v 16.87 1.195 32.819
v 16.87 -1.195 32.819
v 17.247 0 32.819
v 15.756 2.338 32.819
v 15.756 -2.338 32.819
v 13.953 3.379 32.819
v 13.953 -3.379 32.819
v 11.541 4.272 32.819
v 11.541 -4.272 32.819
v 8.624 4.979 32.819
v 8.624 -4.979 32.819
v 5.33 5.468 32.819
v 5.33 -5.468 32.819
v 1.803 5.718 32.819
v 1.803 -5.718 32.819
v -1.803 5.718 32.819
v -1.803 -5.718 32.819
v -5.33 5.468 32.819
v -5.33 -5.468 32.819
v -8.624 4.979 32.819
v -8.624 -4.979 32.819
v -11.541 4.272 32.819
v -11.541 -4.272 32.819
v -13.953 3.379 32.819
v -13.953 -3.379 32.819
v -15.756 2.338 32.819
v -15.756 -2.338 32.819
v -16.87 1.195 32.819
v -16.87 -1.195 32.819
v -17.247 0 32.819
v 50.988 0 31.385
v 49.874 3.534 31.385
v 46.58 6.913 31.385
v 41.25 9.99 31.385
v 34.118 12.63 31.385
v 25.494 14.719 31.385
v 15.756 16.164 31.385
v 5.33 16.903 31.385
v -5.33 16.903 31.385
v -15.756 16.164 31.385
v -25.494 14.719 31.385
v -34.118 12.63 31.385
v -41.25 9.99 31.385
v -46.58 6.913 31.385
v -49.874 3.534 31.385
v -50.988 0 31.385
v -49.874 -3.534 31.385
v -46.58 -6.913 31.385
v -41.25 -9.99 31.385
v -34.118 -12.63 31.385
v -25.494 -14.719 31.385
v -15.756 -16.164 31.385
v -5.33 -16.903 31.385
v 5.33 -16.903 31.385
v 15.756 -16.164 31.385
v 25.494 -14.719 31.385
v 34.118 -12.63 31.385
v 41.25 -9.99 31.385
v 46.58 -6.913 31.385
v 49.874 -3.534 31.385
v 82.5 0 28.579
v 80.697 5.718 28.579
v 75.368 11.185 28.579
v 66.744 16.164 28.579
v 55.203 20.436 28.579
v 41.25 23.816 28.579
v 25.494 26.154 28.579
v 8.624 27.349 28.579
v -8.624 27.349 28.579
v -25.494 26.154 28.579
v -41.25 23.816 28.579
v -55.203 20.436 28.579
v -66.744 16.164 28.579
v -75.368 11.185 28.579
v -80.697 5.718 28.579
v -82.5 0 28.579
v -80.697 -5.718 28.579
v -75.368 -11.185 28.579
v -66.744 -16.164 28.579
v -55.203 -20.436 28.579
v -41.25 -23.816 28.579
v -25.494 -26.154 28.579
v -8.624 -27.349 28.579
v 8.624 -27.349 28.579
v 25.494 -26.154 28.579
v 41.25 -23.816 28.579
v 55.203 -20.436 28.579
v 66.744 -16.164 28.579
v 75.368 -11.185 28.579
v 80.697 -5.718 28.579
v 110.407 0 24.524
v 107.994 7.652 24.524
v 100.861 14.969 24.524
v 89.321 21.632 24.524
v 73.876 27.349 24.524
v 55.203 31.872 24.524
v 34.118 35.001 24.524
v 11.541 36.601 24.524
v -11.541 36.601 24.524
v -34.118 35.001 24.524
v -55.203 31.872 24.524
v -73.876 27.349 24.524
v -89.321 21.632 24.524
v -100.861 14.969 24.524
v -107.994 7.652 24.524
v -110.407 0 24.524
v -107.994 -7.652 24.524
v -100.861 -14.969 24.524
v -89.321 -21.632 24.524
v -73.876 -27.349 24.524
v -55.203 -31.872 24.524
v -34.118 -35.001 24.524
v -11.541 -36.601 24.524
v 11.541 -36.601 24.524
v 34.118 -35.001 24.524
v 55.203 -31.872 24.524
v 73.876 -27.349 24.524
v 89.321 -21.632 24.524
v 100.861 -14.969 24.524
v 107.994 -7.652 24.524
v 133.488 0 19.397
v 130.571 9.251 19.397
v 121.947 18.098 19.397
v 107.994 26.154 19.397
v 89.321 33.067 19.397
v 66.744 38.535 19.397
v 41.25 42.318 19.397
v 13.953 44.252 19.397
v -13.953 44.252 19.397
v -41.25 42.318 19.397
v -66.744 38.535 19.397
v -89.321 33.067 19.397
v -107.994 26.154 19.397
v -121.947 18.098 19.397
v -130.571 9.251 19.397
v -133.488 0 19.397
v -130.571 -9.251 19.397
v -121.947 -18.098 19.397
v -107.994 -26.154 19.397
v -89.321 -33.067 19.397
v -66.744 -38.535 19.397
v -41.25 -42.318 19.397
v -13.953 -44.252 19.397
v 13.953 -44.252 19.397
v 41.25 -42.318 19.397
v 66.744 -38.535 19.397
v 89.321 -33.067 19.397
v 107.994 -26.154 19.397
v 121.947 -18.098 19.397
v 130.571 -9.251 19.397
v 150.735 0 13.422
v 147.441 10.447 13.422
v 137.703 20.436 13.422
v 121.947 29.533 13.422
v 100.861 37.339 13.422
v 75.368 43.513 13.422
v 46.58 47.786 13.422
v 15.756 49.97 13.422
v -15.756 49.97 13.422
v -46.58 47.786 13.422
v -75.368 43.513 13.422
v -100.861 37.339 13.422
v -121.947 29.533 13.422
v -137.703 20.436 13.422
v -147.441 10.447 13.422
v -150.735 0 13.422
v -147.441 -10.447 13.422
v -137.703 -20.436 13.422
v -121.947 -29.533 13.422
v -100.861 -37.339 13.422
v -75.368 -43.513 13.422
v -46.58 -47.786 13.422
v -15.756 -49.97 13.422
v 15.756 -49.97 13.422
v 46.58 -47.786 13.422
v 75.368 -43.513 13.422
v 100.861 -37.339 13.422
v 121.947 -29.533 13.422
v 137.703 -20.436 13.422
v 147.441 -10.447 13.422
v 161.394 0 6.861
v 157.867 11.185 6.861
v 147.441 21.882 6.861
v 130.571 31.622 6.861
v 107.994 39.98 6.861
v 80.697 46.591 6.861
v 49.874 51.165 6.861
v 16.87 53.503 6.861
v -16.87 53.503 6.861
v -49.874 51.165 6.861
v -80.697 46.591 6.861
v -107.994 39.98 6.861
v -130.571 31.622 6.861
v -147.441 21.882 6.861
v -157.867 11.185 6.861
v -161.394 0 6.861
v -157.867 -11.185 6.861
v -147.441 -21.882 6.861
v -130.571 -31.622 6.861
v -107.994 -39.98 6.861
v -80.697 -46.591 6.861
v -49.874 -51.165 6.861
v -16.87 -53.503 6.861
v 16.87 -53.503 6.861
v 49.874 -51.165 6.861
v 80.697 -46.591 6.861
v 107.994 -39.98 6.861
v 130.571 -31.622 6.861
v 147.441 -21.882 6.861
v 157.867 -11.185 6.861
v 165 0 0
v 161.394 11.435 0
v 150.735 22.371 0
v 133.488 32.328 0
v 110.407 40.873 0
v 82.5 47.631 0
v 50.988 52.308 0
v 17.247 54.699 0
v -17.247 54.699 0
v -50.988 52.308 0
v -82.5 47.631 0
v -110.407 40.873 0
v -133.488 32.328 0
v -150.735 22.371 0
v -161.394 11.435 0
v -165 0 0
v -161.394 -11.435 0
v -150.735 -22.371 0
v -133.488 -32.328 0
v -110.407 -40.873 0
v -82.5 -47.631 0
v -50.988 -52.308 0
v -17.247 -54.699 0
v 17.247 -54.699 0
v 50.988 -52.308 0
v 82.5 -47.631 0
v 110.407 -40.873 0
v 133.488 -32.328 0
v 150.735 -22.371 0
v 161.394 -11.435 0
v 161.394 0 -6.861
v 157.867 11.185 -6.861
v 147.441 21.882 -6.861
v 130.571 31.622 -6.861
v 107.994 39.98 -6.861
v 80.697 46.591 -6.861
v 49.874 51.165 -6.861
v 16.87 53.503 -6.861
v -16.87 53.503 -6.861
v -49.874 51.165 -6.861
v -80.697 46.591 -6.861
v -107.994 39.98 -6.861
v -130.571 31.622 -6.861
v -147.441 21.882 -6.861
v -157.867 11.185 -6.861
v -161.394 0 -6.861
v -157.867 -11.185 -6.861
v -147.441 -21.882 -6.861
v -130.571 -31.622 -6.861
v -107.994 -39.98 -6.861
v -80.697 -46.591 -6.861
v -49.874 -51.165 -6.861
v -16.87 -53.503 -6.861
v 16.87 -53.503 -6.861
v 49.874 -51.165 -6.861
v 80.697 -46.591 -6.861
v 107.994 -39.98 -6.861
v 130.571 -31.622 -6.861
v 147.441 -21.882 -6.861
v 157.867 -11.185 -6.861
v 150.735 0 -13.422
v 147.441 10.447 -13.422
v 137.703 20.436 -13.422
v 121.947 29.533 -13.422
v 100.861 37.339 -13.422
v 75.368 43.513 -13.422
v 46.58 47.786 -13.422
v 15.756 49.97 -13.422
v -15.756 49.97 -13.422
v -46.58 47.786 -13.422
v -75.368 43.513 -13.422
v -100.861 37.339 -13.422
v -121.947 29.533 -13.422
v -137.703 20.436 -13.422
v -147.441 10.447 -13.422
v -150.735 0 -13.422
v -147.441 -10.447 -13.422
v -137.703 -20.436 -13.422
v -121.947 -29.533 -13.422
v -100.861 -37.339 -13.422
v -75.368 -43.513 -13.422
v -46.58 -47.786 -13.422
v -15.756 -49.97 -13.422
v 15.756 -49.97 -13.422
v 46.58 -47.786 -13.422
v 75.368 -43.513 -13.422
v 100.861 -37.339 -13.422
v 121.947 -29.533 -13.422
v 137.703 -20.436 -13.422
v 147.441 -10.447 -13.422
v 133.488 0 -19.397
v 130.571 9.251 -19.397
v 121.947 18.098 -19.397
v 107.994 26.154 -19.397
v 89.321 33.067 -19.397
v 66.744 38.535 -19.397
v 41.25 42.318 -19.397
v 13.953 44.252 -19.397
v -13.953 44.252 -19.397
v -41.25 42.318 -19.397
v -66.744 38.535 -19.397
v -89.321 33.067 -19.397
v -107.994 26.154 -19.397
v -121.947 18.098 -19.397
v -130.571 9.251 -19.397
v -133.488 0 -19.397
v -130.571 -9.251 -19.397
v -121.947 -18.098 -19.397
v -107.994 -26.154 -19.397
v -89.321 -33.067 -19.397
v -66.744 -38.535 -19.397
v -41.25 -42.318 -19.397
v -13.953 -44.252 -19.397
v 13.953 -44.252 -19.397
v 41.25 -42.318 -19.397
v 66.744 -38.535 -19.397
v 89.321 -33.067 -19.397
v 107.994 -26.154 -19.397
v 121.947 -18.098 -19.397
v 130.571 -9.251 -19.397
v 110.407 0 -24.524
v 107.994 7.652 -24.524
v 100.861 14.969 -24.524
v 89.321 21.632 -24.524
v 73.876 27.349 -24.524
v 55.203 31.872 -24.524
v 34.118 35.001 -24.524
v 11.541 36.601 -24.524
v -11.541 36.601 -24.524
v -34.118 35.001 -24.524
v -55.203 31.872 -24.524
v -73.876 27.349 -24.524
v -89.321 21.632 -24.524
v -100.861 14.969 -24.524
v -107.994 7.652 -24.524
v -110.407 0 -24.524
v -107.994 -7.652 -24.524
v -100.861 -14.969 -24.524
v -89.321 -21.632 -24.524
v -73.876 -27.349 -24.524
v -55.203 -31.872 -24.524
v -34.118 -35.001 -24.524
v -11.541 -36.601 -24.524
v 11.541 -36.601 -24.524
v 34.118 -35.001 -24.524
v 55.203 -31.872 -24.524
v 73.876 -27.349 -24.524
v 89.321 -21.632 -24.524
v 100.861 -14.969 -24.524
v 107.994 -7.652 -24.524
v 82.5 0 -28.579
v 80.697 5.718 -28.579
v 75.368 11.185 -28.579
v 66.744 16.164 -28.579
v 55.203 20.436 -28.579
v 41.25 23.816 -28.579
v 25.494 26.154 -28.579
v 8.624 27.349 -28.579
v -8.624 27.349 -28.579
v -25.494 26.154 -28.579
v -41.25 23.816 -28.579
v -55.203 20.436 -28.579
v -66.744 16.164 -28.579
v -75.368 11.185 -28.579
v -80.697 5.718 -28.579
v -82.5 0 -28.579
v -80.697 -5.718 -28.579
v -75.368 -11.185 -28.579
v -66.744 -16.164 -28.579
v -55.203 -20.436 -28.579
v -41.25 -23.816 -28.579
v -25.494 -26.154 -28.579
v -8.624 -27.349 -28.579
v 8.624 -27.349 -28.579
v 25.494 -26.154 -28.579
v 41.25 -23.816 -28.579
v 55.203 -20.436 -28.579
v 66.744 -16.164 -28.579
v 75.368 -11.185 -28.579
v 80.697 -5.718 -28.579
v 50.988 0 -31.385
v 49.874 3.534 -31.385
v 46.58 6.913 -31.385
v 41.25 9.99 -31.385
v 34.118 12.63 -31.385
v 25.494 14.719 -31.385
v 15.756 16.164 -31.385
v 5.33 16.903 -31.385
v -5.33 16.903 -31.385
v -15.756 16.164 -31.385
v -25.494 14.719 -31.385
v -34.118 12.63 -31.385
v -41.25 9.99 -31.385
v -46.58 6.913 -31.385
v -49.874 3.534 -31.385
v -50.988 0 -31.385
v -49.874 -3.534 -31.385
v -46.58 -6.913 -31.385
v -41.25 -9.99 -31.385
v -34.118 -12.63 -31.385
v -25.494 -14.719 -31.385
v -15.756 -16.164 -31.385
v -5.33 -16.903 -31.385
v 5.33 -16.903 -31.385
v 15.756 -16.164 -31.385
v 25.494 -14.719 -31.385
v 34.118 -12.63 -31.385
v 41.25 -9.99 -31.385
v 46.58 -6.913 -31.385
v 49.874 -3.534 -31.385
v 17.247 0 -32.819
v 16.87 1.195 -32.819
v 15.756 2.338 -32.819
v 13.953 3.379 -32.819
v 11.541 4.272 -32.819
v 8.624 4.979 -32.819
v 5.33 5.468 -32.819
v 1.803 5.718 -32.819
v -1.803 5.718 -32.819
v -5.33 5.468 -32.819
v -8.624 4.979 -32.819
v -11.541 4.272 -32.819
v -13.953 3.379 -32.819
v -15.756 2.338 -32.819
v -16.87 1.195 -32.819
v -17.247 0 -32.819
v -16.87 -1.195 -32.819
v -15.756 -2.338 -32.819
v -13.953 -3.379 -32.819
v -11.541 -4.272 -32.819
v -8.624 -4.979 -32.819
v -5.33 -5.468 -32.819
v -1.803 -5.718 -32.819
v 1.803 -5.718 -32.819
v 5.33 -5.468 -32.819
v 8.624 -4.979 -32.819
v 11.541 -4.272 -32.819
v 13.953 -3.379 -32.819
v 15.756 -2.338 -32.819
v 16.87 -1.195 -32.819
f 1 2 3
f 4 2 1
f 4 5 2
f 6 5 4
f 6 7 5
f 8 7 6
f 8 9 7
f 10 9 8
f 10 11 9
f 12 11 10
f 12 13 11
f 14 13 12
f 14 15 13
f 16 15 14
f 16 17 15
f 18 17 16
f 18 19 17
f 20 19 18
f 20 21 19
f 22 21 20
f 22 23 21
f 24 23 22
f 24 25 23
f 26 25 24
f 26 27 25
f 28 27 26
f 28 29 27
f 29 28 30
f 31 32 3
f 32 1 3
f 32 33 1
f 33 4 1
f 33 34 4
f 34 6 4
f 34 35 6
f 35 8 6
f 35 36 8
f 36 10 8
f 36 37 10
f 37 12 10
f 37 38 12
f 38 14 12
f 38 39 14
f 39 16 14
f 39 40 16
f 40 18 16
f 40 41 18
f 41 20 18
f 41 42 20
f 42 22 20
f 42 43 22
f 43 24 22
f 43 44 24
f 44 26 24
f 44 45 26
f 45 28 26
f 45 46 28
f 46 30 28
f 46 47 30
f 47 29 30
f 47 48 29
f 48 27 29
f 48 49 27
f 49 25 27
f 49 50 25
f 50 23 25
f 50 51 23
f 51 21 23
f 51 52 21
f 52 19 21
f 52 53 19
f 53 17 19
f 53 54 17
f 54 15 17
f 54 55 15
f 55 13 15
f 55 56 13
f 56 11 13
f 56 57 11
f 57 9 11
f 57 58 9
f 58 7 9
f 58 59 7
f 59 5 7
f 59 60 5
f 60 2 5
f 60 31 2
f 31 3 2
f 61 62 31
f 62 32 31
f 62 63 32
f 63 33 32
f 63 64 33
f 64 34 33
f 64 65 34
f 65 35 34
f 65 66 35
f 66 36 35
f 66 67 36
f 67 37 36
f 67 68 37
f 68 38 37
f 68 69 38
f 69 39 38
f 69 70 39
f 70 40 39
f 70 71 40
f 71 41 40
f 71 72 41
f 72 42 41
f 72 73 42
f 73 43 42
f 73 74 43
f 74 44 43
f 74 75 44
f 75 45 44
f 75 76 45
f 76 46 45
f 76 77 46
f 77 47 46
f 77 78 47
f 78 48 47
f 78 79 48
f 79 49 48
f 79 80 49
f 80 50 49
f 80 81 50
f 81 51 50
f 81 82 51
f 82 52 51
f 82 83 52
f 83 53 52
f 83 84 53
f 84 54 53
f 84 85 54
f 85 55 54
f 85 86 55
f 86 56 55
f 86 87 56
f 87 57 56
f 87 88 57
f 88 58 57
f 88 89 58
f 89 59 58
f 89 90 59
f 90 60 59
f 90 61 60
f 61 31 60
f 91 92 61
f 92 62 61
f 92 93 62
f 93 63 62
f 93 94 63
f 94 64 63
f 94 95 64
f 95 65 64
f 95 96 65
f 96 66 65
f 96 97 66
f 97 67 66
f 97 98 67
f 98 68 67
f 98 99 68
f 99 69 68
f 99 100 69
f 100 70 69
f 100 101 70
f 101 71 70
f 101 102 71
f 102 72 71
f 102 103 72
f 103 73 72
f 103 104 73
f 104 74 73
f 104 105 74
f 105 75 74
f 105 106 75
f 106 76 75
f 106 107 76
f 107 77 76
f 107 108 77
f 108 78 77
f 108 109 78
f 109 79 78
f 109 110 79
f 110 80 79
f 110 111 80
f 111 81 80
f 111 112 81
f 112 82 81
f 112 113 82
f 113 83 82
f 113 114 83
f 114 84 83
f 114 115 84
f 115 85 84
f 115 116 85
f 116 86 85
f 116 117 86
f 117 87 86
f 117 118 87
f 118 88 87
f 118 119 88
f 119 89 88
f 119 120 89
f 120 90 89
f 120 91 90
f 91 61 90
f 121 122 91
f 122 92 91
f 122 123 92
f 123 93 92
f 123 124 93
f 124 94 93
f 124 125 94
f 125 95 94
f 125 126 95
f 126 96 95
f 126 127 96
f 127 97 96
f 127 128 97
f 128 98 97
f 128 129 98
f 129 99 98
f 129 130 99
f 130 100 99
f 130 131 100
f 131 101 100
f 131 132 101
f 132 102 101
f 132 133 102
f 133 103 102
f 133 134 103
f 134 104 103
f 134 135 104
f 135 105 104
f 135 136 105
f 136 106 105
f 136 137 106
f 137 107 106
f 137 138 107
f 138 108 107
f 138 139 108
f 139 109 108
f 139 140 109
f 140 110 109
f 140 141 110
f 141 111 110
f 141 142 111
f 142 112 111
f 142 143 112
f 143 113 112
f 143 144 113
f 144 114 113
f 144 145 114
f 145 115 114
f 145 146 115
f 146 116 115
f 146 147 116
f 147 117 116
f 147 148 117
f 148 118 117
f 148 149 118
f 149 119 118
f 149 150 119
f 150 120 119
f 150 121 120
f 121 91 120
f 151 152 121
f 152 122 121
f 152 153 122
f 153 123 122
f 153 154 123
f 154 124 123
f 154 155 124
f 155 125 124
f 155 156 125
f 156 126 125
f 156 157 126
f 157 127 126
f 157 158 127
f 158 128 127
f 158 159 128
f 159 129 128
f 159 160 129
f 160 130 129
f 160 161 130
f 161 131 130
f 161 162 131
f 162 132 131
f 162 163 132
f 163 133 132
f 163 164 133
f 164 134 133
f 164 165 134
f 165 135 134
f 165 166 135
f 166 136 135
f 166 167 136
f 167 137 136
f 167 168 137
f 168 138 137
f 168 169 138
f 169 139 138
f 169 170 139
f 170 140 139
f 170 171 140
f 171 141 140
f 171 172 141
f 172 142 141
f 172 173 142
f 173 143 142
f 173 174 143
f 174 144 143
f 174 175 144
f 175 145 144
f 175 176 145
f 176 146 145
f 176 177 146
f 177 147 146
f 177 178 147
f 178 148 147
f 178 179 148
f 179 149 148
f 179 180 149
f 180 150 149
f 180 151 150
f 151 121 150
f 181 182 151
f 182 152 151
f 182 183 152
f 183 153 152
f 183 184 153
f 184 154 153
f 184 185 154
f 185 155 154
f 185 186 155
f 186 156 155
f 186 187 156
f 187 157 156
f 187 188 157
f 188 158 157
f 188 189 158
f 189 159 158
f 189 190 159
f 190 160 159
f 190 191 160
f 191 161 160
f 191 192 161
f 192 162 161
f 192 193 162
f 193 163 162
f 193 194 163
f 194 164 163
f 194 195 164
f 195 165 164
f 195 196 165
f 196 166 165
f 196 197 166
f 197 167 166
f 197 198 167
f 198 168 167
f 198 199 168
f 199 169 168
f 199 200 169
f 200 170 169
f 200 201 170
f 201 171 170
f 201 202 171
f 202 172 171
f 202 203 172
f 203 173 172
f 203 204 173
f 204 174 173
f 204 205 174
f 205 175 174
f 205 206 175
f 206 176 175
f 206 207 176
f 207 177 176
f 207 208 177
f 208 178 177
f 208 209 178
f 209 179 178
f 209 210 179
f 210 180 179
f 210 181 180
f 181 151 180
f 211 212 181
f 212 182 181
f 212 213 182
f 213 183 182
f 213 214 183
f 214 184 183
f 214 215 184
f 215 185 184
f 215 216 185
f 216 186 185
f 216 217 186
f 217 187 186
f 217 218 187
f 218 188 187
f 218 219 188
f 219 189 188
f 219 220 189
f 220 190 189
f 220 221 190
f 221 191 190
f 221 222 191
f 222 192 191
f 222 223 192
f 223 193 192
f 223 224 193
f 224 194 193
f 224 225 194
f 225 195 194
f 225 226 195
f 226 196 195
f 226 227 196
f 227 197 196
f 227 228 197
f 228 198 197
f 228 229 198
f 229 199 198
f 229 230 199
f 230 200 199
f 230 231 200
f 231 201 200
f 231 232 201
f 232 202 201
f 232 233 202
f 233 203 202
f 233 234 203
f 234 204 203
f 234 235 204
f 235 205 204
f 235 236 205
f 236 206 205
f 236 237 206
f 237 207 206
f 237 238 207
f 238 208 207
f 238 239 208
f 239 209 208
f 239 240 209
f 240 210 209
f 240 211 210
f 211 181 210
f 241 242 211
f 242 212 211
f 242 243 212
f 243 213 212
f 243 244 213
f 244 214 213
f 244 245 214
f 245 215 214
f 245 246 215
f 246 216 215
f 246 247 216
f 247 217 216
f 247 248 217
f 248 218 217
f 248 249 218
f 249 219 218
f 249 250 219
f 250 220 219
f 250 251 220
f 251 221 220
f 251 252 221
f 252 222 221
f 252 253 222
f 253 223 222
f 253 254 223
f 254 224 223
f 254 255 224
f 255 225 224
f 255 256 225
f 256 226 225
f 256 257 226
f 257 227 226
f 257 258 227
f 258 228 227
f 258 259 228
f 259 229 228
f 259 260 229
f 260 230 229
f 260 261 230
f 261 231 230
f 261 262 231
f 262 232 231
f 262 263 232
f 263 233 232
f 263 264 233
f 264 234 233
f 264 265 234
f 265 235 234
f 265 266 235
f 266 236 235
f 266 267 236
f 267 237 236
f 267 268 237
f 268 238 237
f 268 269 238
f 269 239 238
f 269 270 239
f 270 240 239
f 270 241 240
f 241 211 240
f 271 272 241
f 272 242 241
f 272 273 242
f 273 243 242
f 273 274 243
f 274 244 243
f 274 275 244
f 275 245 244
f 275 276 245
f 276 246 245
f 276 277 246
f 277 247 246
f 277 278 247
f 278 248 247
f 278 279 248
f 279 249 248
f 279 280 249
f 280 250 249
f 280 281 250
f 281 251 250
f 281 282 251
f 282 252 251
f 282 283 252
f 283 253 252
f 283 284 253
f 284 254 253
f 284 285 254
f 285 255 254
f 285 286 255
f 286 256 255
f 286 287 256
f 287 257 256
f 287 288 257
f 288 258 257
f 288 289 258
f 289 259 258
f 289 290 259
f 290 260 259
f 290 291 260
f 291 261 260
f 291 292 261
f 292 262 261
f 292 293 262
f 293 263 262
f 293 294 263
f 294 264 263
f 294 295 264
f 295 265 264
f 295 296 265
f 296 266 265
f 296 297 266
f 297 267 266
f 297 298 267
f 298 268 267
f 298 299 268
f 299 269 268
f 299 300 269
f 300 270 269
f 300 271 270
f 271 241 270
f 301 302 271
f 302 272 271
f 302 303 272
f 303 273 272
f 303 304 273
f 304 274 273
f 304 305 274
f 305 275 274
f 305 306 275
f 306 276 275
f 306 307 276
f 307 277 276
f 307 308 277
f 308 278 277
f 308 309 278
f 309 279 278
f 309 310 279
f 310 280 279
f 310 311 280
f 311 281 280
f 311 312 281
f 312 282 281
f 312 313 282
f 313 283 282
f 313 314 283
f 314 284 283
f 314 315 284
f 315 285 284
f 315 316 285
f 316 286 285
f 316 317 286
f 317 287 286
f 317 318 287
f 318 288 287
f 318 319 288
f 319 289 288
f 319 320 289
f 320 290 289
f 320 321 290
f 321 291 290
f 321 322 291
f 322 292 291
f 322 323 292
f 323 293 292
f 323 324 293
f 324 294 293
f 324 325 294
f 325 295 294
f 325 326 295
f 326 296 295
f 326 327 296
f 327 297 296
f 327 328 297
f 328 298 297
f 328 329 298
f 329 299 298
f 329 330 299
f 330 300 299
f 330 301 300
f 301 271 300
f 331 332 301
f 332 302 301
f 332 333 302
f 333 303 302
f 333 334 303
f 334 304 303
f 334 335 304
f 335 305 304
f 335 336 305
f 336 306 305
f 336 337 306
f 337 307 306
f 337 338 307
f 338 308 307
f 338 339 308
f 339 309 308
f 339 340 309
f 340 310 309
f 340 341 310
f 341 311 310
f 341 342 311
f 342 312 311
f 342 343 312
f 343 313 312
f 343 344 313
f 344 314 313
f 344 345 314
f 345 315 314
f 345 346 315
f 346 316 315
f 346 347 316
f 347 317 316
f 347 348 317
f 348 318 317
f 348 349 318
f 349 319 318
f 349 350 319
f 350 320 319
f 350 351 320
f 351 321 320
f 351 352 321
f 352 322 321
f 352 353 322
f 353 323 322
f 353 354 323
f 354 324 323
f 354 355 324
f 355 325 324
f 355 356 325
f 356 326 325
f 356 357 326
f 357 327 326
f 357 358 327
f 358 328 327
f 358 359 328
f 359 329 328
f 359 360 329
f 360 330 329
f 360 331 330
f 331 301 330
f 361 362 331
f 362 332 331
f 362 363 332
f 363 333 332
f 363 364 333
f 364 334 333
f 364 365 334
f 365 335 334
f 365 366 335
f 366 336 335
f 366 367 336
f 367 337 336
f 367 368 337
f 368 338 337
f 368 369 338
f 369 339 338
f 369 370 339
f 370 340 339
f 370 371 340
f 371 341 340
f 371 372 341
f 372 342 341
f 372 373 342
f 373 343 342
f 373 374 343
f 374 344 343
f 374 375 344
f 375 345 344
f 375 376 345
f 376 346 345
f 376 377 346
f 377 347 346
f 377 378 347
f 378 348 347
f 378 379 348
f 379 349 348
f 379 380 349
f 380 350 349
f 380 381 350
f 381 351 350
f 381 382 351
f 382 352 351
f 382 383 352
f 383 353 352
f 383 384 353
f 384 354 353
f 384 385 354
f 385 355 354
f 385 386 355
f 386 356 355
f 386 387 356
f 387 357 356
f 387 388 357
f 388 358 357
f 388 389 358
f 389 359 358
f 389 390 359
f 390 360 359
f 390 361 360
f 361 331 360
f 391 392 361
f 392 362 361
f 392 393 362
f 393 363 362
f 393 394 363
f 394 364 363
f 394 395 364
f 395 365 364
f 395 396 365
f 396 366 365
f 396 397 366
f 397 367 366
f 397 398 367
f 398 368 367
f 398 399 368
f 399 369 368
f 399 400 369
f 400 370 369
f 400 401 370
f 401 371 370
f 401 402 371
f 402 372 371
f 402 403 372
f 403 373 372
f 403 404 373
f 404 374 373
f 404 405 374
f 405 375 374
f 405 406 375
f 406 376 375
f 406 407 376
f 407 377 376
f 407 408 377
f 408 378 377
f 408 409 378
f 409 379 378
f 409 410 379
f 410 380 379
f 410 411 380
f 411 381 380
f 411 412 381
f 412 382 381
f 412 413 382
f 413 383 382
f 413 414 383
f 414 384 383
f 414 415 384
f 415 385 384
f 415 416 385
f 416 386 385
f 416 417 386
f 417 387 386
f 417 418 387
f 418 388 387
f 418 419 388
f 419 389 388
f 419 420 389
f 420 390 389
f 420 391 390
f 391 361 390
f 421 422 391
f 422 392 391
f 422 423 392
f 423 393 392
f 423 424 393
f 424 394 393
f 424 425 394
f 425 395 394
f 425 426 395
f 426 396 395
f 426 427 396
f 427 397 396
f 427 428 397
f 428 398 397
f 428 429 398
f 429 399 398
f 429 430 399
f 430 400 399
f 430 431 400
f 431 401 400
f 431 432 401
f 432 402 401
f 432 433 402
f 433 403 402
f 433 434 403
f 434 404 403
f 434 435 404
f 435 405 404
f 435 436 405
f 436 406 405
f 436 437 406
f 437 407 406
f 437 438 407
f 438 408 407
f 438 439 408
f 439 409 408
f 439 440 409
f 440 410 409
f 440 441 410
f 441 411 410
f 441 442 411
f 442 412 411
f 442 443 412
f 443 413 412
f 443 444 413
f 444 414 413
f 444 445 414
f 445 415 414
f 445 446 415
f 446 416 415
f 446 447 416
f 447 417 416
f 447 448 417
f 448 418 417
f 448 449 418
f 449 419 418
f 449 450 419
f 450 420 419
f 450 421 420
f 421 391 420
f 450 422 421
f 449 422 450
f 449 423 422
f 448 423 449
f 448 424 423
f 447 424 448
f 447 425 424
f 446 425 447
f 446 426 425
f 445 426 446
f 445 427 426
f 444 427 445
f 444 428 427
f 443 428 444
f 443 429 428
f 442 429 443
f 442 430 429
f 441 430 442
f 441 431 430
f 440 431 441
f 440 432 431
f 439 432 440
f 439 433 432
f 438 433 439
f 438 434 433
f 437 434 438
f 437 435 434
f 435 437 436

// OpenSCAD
// Generated by SolidPython 1.0.1 on 2020-07-29 00:46:51


scale(v = [15, 5, 3]) {
	sphere(r = 11);
}
/***********************************************
*********      SolidPython code:      **********
************************************************
 
# import packages: SolidPython
from solid import *
from solid.utils import *
from itertools import chain, combinations, permutations


class Resize:

    def __init__(self, scad_file):
        self.scad_file = scad_file
        #self.scad_file = import_scad(scad_file)
        # cone/cylinder param:
        self.r1 = 0
        self.r2 = 0
        self.h = 0
        # rectangular prism param:
        self.w = 0
        self.l = 0
        # ellipse param:
        self.r = 0

    # import OpenScad code (file name corresponds to shape)


    # classify shape + parameters
    def assign(self, param1, param2, param3):
        if self.scad_file == 'cone.scad':
            self.r1 = param1
            self.r2 = param2
            self.h = param3
        elif self.scad_file == 'cylinder.scad':
            self.r1 = param1
            self.r2 = param2
            self.h = param3
        elif self.scad_file == 'rectangularPrism.scad':
            self.h = param1
            self.l = param2
            self.w = param3
        else:
            self.r = param1
            self.h = param2

    # resize parameters
    def iterate(self):
        x = range(3, 20, 2)
        i = 1
        if self.scad_file == 'cone.scad':
            tempList = list(permutations(x, 2))
            for temp in tempList:
                param1 = temp[0]
                param2 = temp[1]
                filepath = 'produced_scad_files/' + 'cone' + str(param1) + '_' + str(param2) + '_' + '.scad'
                scad_render_to_file(cylinder(h=param1, r1=param2, r2=0), filepath)

        elif self.scad_file == 'cylinder.scad':
            tempList = list(permutations(x, 3))
            for temp in tempList:
                param1 = temp[0]
                param2 = temp[1]
                filepath = 'produced_scad_files/' + 'cylinder' + str(param1) + '_' + str(param2) + '_' + '.scad'
                scad_render_to_file(cylinder(h=param1, r1=param2, r2=param2), filepath)

        elif self.scad_file == 'rectangularPrism.scad':
            tempList = list(permutations(x, 3))
            for temp in tempList:
                param1 = temp[0]
                param2 = temp[1]
                param3 = temp[2]
                filepath = 'produced_scad_files/' + 'rectangularPrism' + str(param1) + '_' + str(param2) + '_' + str(
                    param3) + '.scad'
                scad_render_to_file(cube(size=(param1, param2, param3)), filepath)

        elif self.scad_file == 'ellipse.scad':
            tempList = list(permutations(x, 4))
            for temp in tempList:
                param1 = temp[0]
                param2 = temp[1]
                param3 = temp[2]
                param4 = temp[3]
                filepath = 'produced_scad_files/' + 'ellipse' + str(param1) + '_' + str(param2) + '_' + str(param3) + '_' + str(param4) + '.scad'
                scad_render_to_file(scale([param1, param2, param3])(sphere(r=param4)), filepath)

    def render_to_scadfile(self):
        scad_render_to_file(scad, 'example.scad') 
 
************************************************/
